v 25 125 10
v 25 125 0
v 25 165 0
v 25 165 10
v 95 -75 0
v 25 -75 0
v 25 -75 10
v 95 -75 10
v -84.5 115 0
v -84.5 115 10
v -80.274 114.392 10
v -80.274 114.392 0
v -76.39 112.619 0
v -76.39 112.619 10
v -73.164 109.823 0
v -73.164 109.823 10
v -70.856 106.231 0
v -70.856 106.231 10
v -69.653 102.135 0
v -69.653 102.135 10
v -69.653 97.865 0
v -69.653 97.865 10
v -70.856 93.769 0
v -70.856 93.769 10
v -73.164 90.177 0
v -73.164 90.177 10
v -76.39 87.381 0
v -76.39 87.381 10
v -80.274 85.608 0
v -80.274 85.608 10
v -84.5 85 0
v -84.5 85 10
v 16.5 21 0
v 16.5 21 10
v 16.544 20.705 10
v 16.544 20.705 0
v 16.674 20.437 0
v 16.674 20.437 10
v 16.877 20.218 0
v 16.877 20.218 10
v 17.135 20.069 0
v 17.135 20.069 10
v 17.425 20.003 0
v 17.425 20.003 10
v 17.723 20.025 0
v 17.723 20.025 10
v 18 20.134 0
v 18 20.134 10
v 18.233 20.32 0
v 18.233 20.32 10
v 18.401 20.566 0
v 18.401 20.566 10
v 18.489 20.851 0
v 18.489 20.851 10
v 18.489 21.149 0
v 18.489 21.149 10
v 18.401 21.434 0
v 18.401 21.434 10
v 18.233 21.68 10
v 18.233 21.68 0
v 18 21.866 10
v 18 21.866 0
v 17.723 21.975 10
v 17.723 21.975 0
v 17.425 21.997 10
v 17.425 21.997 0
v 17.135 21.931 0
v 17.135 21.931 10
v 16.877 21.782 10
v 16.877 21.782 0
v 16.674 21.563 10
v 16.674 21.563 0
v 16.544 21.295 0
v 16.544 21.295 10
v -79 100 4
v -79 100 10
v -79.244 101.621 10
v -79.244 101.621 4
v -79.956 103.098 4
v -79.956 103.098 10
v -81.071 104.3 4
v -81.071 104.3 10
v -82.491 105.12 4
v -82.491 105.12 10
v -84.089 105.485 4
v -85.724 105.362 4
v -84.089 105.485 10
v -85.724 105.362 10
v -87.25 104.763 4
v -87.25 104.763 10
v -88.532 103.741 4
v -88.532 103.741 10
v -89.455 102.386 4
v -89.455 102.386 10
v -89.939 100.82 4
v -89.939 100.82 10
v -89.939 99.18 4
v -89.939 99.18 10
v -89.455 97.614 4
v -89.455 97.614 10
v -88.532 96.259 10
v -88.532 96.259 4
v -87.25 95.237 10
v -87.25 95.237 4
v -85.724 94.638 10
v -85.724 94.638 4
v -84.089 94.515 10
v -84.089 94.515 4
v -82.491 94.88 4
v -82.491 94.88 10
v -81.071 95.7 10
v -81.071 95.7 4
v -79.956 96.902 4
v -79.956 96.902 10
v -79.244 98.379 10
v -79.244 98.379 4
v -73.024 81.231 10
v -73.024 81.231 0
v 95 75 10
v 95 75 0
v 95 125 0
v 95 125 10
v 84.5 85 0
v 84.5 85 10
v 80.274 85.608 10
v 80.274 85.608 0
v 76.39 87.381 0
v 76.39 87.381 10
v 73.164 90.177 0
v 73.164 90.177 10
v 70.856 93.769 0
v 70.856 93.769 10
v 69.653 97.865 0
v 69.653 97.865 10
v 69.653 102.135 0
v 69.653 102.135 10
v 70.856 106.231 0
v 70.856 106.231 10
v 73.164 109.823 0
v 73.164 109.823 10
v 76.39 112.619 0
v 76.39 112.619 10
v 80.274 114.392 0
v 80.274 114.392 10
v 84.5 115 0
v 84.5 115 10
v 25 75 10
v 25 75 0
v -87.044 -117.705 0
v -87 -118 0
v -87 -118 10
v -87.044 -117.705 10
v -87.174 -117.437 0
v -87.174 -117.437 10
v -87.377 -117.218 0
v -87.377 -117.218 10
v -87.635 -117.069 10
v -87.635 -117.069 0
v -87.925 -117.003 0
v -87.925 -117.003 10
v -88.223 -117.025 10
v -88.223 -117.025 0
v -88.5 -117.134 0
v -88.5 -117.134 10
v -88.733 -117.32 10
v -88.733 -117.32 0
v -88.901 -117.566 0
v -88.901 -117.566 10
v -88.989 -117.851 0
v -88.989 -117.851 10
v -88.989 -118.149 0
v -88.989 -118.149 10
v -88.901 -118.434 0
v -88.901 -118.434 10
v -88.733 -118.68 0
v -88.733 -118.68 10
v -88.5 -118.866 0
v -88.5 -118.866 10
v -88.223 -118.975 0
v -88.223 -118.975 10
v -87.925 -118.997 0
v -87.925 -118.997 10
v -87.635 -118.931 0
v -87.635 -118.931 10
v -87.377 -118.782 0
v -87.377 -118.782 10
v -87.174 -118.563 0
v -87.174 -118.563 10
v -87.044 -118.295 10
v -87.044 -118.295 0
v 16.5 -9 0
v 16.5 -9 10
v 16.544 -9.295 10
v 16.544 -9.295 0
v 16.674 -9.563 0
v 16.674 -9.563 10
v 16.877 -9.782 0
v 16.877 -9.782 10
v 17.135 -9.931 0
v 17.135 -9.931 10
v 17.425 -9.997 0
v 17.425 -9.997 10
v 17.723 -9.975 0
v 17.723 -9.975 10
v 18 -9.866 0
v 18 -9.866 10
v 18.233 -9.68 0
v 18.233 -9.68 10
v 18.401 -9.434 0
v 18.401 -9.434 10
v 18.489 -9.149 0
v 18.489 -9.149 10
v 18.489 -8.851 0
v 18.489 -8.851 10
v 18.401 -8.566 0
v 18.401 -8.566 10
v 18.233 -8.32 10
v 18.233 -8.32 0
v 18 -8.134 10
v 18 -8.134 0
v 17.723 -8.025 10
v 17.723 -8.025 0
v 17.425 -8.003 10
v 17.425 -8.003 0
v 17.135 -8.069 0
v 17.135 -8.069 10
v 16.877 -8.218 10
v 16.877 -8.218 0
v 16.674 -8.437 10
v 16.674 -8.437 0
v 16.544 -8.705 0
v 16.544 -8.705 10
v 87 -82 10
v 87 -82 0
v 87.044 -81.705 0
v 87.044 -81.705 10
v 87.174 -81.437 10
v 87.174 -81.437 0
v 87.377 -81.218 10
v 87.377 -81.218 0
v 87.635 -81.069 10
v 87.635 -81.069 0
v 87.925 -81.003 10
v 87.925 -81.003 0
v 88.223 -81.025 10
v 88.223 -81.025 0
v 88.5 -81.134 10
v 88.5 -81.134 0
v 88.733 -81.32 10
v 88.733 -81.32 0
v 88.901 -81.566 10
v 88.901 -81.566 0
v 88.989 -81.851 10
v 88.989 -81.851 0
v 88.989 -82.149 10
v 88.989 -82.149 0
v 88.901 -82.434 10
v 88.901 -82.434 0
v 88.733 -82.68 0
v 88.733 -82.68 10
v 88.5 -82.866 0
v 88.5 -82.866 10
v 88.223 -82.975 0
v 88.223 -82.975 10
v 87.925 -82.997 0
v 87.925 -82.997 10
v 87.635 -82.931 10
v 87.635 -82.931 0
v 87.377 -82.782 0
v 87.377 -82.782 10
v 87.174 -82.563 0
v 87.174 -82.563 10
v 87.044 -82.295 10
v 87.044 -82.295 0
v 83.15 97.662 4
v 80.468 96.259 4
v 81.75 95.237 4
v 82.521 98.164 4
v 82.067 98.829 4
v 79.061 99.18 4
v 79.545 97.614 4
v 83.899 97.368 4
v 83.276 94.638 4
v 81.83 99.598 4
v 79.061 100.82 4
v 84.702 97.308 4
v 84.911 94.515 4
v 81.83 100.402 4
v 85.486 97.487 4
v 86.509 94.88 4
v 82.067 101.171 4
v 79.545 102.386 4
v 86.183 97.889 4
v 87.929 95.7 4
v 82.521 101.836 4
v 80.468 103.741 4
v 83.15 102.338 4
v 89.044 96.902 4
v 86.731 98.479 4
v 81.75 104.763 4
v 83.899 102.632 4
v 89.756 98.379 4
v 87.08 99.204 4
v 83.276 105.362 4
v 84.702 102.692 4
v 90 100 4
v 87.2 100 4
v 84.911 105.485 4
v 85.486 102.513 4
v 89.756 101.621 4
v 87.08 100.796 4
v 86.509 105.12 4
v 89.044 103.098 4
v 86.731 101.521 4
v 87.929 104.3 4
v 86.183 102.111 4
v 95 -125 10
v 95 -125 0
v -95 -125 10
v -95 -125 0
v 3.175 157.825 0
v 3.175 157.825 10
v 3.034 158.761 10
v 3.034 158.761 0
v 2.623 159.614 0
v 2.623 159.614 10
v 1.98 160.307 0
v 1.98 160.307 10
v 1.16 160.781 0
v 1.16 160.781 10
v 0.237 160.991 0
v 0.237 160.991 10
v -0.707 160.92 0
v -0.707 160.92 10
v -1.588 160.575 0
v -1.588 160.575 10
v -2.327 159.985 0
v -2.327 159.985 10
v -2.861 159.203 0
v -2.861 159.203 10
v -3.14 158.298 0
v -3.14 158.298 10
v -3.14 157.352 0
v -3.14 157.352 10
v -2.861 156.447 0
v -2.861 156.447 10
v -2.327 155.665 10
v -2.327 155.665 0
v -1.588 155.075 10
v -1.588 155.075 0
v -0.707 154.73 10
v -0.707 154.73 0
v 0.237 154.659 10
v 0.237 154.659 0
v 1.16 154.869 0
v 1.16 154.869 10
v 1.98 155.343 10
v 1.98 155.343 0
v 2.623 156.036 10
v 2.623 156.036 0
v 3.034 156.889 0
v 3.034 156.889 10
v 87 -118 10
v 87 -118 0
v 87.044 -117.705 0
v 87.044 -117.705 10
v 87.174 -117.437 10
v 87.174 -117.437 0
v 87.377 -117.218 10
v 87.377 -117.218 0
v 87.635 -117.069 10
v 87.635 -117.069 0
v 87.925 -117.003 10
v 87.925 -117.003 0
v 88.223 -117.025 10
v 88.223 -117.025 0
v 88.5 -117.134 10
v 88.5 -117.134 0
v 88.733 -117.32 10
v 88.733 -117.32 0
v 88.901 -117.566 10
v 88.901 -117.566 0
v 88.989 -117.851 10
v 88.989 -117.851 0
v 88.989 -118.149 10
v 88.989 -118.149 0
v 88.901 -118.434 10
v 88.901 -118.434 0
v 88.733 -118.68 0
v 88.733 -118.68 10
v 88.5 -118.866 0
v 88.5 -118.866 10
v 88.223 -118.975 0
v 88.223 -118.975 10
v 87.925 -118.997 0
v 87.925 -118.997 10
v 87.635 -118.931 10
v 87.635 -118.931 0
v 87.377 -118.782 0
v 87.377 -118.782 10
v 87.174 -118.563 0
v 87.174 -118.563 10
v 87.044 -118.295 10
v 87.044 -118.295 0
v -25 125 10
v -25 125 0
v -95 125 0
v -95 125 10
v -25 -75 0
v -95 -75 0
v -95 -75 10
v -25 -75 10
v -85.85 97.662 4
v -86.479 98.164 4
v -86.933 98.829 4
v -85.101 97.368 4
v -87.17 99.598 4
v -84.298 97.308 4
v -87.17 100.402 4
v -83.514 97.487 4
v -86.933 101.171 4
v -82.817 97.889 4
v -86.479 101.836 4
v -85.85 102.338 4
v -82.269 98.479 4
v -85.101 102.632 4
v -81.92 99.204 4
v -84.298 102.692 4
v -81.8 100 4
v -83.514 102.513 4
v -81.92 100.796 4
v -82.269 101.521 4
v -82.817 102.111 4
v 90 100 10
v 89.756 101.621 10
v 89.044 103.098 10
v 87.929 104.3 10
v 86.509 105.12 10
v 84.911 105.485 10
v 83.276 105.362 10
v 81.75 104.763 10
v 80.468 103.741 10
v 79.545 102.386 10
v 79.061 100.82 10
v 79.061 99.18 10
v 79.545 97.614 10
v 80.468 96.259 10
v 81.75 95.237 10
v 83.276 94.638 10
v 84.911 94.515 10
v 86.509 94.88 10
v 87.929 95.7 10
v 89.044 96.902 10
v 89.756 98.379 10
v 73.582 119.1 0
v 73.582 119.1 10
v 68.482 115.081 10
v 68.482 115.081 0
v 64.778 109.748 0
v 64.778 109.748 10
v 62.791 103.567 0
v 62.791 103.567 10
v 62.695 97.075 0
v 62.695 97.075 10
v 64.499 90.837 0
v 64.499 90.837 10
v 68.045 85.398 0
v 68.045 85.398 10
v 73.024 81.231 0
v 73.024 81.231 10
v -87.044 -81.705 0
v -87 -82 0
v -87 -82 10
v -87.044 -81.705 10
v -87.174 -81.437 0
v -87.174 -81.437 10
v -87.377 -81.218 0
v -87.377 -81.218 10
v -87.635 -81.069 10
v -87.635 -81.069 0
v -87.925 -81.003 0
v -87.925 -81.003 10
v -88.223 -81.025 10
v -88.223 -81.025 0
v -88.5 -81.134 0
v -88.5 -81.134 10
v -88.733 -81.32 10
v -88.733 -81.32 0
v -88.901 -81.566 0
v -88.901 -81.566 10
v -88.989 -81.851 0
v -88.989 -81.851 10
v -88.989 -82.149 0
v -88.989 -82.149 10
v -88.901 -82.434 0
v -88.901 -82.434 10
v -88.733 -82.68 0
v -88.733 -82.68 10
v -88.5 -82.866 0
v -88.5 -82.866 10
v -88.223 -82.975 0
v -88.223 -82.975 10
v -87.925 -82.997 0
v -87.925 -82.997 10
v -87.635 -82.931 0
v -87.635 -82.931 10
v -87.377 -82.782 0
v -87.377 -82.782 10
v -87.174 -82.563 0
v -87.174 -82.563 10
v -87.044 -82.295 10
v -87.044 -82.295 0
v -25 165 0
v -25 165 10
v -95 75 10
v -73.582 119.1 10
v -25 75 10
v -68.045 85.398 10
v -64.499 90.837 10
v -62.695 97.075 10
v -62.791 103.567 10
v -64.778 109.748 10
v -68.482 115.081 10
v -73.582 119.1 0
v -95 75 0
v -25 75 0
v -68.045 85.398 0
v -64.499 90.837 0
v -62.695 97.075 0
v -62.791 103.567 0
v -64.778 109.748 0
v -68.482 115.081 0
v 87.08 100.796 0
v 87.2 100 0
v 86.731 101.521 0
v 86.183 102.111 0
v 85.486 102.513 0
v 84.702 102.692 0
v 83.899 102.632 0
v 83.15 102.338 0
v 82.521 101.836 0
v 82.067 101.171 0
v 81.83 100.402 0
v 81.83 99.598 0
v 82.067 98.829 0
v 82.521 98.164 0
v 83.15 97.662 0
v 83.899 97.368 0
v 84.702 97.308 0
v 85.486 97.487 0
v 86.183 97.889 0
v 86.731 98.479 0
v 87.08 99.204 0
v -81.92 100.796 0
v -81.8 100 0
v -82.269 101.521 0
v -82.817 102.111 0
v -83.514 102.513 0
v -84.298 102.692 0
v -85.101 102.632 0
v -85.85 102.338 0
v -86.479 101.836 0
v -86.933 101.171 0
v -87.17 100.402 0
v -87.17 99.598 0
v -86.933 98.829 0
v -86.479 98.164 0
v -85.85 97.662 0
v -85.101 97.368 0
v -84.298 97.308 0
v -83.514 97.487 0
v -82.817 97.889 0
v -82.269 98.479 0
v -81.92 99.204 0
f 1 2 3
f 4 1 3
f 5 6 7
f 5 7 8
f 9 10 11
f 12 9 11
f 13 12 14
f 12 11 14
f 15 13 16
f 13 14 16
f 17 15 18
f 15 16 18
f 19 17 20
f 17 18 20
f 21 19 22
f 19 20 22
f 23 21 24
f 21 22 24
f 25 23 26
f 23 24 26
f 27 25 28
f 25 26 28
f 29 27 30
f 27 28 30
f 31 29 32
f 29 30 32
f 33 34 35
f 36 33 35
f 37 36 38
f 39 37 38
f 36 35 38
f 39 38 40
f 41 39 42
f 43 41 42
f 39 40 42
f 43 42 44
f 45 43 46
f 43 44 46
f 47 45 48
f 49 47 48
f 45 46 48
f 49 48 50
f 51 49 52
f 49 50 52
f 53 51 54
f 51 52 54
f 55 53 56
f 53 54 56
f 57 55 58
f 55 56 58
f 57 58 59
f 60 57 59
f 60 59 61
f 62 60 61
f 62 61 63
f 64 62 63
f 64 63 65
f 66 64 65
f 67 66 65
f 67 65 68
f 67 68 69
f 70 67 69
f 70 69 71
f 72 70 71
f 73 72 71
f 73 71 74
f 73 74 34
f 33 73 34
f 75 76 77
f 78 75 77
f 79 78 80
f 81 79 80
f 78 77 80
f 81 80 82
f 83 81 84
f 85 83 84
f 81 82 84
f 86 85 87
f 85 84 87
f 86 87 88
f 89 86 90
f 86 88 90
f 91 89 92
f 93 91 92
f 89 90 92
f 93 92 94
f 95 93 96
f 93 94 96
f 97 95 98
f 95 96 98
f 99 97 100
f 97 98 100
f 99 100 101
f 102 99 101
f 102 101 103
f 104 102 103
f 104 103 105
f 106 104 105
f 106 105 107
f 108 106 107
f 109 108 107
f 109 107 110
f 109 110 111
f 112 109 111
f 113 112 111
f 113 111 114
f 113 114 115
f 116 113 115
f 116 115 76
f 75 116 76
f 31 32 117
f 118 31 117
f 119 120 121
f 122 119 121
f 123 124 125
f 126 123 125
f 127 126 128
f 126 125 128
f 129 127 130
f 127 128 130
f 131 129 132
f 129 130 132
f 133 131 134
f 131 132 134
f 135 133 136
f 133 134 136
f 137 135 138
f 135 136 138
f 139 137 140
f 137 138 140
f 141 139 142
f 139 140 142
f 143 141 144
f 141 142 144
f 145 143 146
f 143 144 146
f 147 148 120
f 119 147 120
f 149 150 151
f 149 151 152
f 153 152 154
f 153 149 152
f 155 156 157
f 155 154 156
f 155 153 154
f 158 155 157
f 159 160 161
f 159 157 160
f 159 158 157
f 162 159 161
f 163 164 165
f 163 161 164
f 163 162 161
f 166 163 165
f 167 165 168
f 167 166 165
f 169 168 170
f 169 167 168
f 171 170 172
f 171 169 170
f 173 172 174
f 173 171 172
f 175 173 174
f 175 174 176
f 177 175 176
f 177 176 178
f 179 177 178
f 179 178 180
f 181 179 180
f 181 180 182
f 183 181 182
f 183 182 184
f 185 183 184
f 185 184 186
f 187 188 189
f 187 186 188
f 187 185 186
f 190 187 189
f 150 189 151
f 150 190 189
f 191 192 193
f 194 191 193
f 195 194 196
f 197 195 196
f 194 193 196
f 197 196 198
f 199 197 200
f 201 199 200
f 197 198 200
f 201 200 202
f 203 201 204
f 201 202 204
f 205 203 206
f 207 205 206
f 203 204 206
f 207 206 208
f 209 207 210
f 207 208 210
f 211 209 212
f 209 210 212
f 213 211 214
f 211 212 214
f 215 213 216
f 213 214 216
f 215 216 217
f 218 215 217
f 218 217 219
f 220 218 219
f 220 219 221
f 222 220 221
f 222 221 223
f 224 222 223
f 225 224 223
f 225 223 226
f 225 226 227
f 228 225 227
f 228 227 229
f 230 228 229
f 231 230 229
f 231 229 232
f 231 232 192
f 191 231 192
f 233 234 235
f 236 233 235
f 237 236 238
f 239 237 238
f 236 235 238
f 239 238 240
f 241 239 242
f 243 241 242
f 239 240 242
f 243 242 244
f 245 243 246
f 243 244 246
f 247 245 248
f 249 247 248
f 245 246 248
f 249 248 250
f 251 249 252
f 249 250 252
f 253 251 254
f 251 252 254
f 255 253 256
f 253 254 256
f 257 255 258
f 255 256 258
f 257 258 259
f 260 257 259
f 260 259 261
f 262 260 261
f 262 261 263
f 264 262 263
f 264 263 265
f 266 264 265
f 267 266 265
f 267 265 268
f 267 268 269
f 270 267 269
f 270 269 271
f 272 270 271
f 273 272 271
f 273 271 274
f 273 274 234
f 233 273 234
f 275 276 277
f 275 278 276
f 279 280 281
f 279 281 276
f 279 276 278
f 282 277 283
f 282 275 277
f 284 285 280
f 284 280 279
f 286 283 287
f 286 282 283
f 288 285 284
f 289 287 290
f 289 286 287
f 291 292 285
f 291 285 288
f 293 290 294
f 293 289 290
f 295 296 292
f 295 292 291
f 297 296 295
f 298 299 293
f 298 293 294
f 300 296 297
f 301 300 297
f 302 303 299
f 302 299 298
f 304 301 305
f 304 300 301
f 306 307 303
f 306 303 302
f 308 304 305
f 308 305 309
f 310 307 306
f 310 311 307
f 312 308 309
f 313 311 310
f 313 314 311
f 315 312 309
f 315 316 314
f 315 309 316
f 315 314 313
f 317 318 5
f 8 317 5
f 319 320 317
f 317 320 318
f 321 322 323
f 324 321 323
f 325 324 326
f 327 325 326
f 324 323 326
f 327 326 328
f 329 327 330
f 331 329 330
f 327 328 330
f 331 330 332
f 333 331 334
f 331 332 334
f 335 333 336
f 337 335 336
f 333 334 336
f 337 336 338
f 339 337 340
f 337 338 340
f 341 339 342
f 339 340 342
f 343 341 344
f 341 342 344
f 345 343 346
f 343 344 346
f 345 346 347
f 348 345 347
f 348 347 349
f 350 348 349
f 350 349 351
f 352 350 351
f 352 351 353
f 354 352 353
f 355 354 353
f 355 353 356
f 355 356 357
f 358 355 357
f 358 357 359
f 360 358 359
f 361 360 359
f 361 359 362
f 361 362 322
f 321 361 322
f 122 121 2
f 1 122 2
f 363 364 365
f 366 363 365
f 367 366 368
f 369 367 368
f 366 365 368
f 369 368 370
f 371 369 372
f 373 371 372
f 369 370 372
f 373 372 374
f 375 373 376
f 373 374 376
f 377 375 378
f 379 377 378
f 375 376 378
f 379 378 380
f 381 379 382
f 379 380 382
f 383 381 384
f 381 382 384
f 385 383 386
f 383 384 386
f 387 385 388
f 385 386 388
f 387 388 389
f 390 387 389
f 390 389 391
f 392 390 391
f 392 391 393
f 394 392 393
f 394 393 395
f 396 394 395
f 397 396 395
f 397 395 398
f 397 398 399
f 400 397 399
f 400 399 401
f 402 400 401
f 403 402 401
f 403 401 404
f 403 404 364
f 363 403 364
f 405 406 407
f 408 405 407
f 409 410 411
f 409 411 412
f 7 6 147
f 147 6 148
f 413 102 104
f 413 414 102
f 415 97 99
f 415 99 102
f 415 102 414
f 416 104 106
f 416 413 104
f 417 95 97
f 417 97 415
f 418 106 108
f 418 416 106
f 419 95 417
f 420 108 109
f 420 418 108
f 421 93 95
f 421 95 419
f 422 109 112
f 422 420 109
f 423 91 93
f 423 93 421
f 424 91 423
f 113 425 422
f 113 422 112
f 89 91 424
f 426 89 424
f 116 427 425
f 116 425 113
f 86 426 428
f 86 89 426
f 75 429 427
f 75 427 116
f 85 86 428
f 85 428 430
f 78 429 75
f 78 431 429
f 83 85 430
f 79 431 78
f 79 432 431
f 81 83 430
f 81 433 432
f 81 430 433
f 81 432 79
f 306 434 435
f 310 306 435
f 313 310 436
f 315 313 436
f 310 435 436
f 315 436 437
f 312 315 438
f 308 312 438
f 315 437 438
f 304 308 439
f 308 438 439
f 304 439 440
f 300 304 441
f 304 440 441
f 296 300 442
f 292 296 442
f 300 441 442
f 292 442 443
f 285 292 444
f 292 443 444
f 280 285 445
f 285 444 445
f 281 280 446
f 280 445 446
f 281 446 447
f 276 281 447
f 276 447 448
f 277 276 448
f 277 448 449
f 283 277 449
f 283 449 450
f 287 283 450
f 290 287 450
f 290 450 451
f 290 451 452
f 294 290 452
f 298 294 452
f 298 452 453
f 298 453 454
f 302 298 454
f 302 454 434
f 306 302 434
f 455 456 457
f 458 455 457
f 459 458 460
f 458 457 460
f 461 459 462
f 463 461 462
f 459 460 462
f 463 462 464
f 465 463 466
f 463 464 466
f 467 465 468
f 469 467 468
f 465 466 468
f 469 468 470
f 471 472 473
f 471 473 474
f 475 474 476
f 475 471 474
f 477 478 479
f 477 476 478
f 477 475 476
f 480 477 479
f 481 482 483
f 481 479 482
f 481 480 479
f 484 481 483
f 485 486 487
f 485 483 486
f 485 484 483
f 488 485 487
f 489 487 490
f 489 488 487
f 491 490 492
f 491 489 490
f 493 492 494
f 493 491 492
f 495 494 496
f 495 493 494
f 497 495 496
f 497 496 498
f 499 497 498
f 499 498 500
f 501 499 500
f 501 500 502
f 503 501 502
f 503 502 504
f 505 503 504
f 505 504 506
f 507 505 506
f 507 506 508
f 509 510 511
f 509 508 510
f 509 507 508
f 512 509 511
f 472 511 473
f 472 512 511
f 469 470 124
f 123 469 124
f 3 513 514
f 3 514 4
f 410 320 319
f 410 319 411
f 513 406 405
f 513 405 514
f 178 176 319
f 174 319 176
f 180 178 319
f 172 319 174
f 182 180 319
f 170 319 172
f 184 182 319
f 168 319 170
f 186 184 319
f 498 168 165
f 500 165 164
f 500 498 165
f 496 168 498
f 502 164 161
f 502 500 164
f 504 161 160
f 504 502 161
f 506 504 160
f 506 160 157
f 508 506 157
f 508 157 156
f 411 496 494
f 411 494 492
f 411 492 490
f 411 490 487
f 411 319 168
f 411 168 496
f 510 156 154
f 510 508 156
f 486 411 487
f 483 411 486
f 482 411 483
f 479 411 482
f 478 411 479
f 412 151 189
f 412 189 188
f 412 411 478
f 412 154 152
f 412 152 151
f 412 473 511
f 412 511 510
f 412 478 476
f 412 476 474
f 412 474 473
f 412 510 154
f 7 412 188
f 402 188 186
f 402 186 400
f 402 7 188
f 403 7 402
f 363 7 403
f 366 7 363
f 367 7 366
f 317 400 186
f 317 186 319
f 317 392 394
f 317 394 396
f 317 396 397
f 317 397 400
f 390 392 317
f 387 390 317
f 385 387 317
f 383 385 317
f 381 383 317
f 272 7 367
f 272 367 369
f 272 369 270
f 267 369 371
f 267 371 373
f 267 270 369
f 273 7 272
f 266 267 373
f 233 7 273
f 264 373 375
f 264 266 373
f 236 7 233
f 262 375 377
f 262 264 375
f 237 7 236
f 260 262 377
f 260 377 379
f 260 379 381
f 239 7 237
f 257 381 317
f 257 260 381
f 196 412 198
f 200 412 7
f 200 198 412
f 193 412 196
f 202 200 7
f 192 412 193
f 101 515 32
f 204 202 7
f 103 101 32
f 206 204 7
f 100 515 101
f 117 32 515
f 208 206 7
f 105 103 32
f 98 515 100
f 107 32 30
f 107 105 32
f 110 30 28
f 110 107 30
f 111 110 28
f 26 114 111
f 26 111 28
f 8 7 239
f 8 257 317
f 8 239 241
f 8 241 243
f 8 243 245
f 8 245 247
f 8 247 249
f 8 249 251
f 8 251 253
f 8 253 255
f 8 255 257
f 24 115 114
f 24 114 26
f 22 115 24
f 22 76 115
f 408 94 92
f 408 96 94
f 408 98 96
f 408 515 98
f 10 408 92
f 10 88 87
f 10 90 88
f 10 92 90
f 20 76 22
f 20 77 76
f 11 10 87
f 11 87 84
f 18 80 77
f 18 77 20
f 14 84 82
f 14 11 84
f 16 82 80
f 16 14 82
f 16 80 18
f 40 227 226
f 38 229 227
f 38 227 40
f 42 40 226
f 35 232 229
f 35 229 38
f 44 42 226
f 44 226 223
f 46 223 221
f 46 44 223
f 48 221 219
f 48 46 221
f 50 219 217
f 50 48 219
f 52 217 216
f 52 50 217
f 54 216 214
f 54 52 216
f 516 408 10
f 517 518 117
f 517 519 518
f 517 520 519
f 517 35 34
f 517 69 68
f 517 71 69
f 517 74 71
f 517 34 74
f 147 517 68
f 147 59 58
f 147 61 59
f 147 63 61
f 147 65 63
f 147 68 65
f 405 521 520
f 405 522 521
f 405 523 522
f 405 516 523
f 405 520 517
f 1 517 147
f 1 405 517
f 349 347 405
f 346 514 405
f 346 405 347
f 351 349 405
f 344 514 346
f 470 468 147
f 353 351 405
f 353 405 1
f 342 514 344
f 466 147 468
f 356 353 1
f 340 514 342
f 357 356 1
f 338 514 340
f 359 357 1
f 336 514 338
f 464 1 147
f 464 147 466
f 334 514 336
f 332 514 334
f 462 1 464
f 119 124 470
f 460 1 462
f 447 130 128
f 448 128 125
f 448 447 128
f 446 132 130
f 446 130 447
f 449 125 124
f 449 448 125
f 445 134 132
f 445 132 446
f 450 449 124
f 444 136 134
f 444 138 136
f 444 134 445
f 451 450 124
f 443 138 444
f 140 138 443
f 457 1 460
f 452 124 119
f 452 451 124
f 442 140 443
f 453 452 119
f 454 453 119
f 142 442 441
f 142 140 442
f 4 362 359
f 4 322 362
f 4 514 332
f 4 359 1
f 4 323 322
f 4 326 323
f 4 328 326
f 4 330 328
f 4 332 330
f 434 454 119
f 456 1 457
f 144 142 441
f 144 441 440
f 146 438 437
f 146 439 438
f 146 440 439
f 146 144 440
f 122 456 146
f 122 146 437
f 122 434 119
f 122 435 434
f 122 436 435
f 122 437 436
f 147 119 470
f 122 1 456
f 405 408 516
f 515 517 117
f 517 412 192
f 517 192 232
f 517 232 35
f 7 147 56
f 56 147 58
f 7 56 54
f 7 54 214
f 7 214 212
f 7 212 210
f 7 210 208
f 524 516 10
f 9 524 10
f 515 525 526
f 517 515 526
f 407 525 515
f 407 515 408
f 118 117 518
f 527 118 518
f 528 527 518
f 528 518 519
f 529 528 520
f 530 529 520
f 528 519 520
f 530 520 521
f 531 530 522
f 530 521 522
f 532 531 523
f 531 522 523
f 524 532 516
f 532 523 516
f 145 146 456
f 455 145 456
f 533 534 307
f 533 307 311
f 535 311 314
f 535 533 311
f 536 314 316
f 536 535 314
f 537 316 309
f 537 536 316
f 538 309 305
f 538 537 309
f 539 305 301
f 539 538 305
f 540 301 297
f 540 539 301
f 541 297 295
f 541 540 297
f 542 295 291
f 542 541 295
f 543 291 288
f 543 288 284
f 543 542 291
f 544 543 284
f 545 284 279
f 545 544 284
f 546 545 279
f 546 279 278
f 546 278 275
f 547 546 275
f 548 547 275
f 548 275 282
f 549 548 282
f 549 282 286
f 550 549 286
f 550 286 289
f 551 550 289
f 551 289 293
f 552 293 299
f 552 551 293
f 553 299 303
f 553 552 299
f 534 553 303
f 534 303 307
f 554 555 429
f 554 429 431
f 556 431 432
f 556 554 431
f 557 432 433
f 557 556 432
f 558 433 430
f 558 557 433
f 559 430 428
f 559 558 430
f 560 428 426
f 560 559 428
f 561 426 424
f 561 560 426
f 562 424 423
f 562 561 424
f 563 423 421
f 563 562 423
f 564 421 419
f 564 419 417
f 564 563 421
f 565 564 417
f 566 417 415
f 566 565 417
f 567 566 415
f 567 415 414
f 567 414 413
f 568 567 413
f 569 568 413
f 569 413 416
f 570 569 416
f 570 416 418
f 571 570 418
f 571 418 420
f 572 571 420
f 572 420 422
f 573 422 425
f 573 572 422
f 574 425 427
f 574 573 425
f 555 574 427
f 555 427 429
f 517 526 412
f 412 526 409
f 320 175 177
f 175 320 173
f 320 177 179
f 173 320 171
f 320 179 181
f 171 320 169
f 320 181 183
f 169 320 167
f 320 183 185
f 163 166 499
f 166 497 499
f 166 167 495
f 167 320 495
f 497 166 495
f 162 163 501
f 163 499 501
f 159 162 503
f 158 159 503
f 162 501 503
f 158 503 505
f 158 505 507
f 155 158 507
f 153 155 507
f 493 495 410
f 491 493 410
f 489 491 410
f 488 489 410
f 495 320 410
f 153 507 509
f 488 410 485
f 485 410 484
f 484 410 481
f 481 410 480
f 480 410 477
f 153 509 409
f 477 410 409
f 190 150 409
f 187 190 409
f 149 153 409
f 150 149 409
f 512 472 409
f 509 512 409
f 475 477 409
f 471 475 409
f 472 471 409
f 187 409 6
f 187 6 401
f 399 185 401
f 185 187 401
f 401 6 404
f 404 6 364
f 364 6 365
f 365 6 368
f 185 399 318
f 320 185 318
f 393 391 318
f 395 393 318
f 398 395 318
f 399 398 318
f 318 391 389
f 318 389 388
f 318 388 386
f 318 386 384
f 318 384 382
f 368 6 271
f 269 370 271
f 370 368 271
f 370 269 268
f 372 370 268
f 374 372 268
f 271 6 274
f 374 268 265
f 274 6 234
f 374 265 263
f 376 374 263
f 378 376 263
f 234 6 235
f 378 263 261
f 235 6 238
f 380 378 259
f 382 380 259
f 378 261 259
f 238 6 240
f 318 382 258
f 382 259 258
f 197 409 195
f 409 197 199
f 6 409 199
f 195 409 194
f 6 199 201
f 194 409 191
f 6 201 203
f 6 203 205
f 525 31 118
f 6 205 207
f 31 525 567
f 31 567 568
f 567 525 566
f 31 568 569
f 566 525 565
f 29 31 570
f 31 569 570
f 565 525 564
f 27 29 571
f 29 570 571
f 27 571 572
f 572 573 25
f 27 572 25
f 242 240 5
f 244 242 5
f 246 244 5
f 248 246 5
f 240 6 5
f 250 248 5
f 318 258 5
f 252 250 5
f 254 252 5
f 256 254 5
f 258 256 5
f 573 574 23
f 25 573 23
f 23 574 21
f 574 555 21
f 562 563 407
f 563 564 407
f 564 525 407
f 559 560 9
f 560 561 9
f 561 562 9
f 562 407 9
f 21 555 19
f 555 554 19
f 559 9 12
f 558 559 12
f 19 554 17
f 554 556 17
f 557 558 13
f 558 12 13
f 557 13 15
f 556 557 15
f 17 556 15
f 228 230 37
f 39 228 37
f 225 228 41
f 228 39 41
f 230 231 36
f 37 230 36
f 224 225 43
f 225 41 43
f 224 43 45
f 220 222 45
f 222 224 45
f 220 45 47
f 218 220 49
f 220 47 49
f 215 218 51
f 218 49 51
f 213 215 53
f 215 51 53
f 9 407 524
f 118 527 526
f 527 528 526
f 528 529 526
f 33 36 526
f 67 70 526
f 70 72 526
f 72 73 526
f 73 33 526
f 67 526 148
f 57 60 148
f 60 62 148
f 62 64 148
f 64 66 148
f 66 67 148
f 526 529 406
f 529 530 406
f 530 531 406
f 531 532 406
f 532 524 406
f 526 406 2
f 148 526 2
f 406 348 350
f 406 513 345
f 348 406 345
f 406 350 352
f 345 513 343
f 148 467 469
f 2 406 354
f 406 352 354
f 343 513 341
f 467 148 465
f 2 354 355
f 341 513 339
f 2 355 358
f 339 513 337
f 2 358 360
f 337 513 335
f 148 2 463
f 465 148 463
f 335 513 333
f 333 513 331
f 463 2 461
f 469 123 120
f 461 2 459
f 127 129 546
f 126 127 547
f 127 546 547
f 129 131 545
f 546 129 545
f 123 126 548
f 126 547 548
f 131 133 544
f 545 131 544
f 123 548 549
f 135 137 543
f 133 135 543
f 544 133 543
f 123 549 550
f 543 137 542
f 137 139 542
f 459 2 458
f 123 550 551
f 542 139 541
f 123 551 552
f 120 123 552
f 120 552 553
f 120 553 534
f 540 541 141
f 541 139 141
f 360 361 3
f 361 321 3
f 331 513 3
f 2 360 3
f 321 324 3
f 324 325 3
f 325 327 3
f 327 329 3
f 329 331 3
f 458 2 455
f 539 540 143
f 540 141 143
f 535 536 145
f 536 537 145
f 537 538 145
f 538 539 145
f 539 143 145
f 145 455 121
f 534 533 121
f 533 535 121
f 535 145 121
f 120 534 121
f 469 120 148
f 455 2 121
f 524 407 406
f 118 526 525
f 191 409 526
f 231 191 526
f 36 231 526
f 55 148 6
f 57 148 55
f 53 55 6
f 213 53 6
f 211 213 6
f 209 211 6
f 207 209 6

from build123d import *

# Parameters (mm, degrees)
F0_W      = 50
F0_H      = 150
F0_H_2    = 50
F0_W_2    = 70
F0_H_3    = 40
F1_DEPTH  = 10
F2_R      = 3.175
F3_DEPTH  = 10.001
F4_R      = 5.5
F5_DEPTH  = 10.001
F6_R      = 5.5
F7_DEPTH  = 10.001
F9_DEPTH  = 10.001
F11_D     = 2
F13_D     = 2
F14_R     = 5.5
F14_R_2   = 2.7
F15_DEPTH = 4
F16_DEPTH = 4


# Not quite as in the source:
# - a pattern or mirror of a feature is missing from the dataset's text; its kind, count and spacing are read off the source's solid
# - a feature names something its author has since deleted; it is built from what else it names


with BuildPart() as f1:
    # F0 (on Top) → F1 (new body)
    with BuildSketch(Plane.XY):
        Rectangle(F0_W, F0_H)
        with Locations((0, 100)):
            Rectangle(F0_W, F0_H_2)
        with Locations((60, 100)):
            Rectangle(F0_W_2, F0_H_2)
        with Locations((-60, 100)):
            Rectangle(F0_W_2, F0_H_2)
        with Locations((0, -100)):
            Rectangle(F0_W, F0_H_2)
        with Locations((60, -100)):
            Rectangle(F0_W_2, F0_H_2)
        with Locations((0, 145)):
            Rectangle(F0_W, F0_H_3)
        with Locations((-60, -100)):
            Rectangle(F0_W_2, F0_H_2)
    extrude(amount=F1_DEPTH)

    # F2 (on face) → F3 (cut, through all)
    with BuildSketch(Plane.XY.offset(10)):
        with Locations((0, 157.825)):
            Circle(F2_R)
    extrude(amount=-F3_DEPTH, mode=Mode.SUBTRACT)

    # F4 (on face) → F5 (cut, through all)
    with BuildSketch(Plane.XY.offset(10)):
        with Locations((-84.5, 100)):
            Circle(F4_R)
    extrude(amount=-F5_DEPTH, mode=Mode.SUBTRACT)

    # F6 (on face) → F7 (cut, through all)
    with BuildSketch(Plane.XY.offset(10)):
        with Locations((84.5, 100)):
            Circle(F6_R)
    extrude(amount=-F7_DEPTH, mode=Mode.SUBTRACT)

    # F8 (on face) → F9 (cut, through all)
    with BuildSketch(Plane.XY.offset(10)):
        with BuildLine():
            Line((73.023525645, 81.2305957373), (84.5, 85))
            ThreePointArc((84.5, 85), (69.5, 100), (84.5, 115))
            Line((84.5, 115), (73.5817295179, 119.0995122891))
            ThreePointArc((73.5817295179, 119.0995122891), (62.5023896916, 100.3242540951), (73.023525645, 81.2305957373))
        make_face()
        with BuildLine():
            Line((-84.5, 85), (-73.023525645, 81.2305957373))
            ThreePointArc((-73.023525645, 81.2305957373), (-62.5023896916, 100.3242540951), (-73.5817295179, 119.0995122891))
            Line((-73.5817295179, 119.0995122891), (-84.5, 115))
            ThreePointArc((-84.5, 115), (-69.5, 100), (-84.5, 85))
        make_face()
    extrude(amount=-F9_DEPTH, mode=Mode.SUBTRACT)

    # F11 (through all)
    with Locations(Plane.XY.offset(10)):
        with Locations((88, -82), (88, -118)):
            f11 = Hole(F11_D / 2)

    # F11_copies: F11 across plane
    add(f11.mirror(Plane(origin=(0, 0, 0), x_dir=(0, 0, -1), z_dir=(-1, 0, 0))), mode=Mode.SUBTRACT)

    # F13 (through all)
    with Locations(Plane(origin=(0, 0, 0), x_dir=(1, 0, 0), z_dir=(0, 0, -1))):
        with Locations((17.5, -21), (17.5, 9)):
            Hole(F13_D / 2)

    # F14 (on Top) → F15 (join)
    with BuildSketch(Plane.XY):
        with Locations((84.5, 100)):
            Circle(F14_R)
        with Locations((84.5, 100)):
            Circle(F14_R_2, mode=Mode.SUBTRACT)
        with Locations((-84.5, 100)):
            Circle(F14_R)
        with Locations((-84.5, 100)):
            Circle(F14_R_2, mode=Mode.SUBTRACT)
    extrude(amount=F15_DEPTH)

    # F14 (on Top) → F16 (join)
    with BuildSketch(Plane.XY):
        with Locations((84.5, 100)):
            Circle(F14_R)
        with Locations((84.5, 100)):
            Circle(F14_R_2, mode=Mode.SUBTRACT)
        with Locations((-84.5, 100)):
            Circle(F14_R)
        with Locations((-84.5, 100)):
            Circle(F14_R_2, mode=Mode.SUBTRACT)
    extrude(amount=F16_DEPTH)


solid = f1.part
